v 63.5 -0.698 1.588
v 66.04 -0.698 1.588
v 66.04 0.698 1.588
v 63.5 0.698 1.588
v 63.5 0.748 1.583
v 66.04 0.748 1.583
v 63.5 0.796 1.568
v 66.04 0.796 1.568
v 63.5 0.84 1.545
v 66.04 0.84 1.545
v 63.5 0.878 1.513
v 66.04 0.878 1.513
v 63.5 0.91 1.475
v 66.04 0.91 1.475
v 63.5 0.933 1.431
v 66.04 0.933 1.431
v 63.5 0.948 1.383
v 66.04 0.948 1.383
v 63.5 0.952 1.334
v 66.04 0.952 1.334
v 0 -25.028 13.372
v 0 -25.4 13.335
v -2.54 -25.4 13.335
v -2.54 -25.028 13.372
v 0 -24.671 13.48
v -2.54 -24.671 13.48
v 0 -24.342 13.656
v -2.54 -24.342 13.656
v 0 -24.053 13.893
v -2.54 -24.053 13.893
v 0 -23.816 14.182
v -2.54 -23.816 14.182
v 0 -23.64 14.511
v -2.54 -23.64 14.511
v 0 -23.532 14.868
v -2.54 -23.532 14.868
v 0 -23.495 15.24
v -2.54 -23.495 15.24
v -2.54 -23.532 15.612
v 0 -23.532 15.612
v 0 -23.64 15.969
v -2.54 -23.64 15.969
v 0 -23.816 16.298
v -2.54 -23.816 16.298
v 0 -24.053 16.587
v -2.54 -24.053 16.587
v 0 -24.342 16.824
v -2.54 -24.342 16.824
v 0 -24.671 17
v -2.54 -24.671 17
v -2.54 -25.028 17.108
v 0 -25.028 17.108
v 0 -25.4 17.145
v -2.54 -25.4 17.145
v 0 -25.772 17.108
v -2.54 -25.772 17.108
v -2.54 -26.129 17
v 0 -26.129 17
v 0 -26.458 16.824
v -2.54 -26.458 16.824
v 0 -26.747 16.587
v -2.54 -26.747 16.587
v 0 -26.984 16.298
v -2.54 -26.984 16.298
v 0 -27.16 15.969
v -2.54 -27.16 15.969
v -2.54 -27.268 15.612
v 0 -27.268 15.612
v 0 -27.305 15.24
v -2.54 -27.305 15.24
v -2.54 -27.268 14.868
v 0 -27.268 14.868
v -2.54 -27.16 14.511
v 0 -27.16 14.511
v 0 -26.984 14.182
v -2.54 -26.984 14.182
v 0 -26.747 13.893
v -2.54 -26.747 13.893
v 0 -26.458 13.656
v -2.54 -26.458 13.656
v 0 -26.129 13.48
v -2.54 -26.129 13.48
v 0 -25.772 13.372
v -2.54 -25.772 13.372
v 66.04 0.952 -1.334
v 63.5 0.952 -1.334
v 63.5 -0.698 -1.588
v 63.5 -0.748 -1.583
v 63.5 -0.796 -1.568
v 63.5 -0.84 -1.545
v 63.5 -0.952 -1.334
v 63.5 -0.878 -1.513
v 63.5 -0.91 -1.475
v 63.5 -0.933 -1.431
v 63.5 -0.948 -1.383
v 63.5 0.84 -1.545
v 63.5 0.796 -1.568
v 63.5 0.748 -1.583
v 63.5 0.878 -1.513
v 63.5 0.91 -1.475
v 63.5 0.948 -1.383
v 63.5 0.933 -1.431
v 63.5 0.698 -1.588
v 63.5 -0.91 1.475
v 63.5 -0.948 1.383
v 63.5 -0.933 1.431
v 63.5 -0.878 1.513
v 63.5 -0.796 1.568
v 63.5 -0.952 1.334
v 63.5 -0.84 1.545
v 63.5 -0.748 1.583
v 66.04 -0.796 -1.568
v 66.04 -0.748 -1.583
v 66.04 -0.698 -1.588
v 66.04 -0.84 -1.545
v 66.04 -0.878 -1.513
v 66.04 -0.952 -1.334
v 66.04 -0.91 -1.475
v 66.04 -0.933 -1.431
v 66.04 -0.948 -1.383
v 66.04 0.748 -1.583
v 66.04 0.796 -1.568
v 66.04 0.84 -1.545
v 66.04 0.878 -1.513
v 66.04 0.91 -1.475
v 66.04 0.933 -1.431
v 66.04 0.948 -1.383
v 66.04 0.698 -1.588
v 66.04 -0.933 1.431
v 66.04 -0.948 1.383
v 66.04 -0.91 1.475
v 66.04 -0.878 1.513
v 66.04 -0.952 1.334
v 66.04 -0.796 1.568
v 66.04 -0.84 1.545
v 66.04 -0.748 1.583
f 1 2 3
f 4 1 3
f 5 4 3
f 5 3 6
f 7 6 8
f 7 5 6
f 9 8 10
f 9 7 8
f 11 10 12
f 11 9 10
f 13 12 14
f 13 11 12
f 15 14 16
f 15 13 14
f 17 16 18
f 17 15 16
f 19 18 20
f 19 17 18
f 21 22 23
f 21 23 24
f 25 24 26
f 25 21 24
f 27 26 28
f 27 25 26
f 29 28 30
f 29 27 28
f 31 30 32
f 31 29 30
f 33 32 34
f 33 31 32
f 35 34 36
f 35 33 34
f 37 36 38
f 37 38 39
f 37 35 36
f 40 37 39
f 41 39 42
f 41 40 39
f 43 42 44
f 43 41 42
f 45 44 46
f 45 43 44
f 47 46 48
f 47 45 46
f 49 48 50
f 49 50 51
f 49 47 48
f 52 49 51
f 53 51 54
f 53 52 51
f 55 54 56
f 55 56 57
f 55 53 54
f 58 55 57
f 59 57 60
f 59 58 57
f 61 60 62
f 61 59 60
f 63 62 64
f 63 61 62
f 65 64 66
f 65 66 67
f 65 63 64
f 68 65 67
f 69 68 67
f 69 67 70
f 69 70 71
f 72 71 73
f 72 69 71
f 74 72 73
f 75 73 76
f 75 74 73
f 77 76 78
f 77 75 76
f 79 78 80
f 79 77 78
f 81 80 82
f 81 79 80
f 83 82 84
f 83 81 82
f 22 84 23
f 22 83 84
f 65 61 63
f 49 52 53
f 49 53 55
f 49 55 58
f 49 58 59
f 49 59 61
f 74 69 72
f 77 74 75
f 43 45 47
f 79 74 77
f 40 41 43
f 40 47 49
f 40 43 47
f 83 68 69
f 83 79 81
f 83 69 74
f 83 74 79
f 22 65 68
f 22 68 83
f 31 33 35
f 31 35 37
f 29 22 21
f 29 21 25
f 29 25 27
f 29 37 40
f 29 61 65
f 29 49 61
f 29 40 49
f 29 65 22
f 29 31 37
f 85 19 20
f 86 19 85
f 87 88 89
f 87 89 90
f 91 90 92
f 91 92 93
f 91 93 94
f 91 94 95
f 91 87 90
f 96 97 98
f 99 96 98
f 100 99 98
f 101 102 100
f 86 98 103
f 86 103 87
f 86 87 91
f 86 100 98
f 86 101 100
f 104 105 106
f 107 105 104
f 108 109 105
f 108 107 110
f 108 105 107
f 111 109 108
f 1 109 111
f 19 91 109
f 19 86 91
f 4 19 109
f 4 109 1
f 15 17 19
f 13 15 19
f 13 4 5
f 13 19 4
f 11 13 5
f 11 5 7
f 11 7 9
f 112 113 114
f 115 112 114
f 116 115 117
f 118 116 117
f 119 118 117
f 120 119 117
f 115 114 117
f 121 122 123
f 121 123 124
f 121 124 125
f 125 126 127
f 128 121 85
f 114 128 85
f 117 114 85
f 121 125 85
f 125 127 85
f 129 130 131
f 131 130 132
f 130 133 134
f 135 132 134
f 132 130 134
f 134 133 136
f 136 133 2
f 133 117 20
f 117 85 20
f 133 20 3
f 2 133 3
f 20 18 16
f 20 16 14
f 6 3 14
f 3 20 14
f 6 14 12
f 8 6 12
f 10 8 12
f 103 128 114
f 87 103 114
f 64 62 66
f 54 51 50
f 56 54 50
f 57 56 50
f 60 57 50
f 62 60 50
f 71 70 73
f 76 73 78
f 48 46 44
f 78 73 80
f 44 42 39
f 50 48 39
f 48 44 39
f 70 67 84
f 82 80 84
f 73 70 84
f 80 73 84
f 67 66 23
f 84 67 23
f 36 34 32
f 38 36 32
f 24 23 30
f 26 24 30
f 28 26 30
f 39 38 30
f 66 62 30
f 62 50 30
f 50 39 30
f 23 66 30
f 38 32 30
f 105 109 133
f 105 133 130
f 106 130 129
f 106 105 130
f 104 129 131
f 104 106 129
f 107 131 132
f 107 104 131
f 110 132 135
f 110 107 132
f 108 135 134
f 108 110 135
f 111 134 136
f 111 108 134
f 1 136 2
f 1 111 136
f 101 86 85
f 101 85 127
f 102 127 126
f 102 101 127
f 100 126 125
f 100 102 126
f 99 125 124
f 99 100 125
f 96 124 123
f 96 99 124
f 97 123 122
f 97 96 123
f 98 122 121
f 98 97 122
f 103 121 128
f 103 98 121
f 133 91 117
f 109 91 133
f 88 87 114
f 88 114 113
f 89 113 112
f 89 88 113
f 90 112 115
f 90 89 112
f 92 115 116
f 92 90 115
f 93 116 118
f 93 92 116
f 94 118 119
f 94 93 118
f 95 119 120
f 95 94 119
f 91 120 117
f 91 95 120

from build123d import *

# Parameters (mm, degrees)
SKETCH1_R      = 1.905
EXTRUDE1_DEPTH = 2.54
EXTRUDE2_DEPTH = 2.54


with BuildPart() as part:
    # Sketch1 → Extrude1 (new body)
    with BuildSketch(Plane(origin=(0, 0, 0), x_dir=(0, 0, -1), z_dir=(1, 0, 0))):
        with Locations((-15.24, -25.4)):
            Circle(SKETCH1_R)
    extrude(amount=-EXTRUDE1_DEPTH)


with BuildPart() as body_2:
    # Sketch2 → Extrude2 (new body)
    with BuildSketch(Plane(origin=(63.5, 0, 0), x_dir=(0, 0, -1), z_dir=(1, 0, 0))):
        with BuildLine():
            Line((-1.3335, 0.9525), (1.3335, 0.9525))
            ThreePointArc((1.3335, 0.9525), (1.513105122, 0.878105122), (1.5875, 0.6985))
            Line((1.5875, 0.6985), (1.5875, -0.6985))
            ThreePointArc((1.5875, -0.6985), (1.513105122, -0.878105122), (1.3335, -0.9525))
            Line((1.3335, -0.9525), (-1.3335, -0.9525))
            ThreePointArc((-1.3335, -0.9525), (-1.513105122, -0.878105122), (-1.5875, -0.6985))
            Line((-1.5875, -0.6985), (-1.5875, 0.6985))
            ThreePointArc((-1.5875, 0.6985), (-1.513105122, 0.878105122), (-1.3335, 0.9525))
        make_face()
    extrude(amount=EXTRUDE2_DEPTH)


solid = Compound([part.part, body_2.part])
